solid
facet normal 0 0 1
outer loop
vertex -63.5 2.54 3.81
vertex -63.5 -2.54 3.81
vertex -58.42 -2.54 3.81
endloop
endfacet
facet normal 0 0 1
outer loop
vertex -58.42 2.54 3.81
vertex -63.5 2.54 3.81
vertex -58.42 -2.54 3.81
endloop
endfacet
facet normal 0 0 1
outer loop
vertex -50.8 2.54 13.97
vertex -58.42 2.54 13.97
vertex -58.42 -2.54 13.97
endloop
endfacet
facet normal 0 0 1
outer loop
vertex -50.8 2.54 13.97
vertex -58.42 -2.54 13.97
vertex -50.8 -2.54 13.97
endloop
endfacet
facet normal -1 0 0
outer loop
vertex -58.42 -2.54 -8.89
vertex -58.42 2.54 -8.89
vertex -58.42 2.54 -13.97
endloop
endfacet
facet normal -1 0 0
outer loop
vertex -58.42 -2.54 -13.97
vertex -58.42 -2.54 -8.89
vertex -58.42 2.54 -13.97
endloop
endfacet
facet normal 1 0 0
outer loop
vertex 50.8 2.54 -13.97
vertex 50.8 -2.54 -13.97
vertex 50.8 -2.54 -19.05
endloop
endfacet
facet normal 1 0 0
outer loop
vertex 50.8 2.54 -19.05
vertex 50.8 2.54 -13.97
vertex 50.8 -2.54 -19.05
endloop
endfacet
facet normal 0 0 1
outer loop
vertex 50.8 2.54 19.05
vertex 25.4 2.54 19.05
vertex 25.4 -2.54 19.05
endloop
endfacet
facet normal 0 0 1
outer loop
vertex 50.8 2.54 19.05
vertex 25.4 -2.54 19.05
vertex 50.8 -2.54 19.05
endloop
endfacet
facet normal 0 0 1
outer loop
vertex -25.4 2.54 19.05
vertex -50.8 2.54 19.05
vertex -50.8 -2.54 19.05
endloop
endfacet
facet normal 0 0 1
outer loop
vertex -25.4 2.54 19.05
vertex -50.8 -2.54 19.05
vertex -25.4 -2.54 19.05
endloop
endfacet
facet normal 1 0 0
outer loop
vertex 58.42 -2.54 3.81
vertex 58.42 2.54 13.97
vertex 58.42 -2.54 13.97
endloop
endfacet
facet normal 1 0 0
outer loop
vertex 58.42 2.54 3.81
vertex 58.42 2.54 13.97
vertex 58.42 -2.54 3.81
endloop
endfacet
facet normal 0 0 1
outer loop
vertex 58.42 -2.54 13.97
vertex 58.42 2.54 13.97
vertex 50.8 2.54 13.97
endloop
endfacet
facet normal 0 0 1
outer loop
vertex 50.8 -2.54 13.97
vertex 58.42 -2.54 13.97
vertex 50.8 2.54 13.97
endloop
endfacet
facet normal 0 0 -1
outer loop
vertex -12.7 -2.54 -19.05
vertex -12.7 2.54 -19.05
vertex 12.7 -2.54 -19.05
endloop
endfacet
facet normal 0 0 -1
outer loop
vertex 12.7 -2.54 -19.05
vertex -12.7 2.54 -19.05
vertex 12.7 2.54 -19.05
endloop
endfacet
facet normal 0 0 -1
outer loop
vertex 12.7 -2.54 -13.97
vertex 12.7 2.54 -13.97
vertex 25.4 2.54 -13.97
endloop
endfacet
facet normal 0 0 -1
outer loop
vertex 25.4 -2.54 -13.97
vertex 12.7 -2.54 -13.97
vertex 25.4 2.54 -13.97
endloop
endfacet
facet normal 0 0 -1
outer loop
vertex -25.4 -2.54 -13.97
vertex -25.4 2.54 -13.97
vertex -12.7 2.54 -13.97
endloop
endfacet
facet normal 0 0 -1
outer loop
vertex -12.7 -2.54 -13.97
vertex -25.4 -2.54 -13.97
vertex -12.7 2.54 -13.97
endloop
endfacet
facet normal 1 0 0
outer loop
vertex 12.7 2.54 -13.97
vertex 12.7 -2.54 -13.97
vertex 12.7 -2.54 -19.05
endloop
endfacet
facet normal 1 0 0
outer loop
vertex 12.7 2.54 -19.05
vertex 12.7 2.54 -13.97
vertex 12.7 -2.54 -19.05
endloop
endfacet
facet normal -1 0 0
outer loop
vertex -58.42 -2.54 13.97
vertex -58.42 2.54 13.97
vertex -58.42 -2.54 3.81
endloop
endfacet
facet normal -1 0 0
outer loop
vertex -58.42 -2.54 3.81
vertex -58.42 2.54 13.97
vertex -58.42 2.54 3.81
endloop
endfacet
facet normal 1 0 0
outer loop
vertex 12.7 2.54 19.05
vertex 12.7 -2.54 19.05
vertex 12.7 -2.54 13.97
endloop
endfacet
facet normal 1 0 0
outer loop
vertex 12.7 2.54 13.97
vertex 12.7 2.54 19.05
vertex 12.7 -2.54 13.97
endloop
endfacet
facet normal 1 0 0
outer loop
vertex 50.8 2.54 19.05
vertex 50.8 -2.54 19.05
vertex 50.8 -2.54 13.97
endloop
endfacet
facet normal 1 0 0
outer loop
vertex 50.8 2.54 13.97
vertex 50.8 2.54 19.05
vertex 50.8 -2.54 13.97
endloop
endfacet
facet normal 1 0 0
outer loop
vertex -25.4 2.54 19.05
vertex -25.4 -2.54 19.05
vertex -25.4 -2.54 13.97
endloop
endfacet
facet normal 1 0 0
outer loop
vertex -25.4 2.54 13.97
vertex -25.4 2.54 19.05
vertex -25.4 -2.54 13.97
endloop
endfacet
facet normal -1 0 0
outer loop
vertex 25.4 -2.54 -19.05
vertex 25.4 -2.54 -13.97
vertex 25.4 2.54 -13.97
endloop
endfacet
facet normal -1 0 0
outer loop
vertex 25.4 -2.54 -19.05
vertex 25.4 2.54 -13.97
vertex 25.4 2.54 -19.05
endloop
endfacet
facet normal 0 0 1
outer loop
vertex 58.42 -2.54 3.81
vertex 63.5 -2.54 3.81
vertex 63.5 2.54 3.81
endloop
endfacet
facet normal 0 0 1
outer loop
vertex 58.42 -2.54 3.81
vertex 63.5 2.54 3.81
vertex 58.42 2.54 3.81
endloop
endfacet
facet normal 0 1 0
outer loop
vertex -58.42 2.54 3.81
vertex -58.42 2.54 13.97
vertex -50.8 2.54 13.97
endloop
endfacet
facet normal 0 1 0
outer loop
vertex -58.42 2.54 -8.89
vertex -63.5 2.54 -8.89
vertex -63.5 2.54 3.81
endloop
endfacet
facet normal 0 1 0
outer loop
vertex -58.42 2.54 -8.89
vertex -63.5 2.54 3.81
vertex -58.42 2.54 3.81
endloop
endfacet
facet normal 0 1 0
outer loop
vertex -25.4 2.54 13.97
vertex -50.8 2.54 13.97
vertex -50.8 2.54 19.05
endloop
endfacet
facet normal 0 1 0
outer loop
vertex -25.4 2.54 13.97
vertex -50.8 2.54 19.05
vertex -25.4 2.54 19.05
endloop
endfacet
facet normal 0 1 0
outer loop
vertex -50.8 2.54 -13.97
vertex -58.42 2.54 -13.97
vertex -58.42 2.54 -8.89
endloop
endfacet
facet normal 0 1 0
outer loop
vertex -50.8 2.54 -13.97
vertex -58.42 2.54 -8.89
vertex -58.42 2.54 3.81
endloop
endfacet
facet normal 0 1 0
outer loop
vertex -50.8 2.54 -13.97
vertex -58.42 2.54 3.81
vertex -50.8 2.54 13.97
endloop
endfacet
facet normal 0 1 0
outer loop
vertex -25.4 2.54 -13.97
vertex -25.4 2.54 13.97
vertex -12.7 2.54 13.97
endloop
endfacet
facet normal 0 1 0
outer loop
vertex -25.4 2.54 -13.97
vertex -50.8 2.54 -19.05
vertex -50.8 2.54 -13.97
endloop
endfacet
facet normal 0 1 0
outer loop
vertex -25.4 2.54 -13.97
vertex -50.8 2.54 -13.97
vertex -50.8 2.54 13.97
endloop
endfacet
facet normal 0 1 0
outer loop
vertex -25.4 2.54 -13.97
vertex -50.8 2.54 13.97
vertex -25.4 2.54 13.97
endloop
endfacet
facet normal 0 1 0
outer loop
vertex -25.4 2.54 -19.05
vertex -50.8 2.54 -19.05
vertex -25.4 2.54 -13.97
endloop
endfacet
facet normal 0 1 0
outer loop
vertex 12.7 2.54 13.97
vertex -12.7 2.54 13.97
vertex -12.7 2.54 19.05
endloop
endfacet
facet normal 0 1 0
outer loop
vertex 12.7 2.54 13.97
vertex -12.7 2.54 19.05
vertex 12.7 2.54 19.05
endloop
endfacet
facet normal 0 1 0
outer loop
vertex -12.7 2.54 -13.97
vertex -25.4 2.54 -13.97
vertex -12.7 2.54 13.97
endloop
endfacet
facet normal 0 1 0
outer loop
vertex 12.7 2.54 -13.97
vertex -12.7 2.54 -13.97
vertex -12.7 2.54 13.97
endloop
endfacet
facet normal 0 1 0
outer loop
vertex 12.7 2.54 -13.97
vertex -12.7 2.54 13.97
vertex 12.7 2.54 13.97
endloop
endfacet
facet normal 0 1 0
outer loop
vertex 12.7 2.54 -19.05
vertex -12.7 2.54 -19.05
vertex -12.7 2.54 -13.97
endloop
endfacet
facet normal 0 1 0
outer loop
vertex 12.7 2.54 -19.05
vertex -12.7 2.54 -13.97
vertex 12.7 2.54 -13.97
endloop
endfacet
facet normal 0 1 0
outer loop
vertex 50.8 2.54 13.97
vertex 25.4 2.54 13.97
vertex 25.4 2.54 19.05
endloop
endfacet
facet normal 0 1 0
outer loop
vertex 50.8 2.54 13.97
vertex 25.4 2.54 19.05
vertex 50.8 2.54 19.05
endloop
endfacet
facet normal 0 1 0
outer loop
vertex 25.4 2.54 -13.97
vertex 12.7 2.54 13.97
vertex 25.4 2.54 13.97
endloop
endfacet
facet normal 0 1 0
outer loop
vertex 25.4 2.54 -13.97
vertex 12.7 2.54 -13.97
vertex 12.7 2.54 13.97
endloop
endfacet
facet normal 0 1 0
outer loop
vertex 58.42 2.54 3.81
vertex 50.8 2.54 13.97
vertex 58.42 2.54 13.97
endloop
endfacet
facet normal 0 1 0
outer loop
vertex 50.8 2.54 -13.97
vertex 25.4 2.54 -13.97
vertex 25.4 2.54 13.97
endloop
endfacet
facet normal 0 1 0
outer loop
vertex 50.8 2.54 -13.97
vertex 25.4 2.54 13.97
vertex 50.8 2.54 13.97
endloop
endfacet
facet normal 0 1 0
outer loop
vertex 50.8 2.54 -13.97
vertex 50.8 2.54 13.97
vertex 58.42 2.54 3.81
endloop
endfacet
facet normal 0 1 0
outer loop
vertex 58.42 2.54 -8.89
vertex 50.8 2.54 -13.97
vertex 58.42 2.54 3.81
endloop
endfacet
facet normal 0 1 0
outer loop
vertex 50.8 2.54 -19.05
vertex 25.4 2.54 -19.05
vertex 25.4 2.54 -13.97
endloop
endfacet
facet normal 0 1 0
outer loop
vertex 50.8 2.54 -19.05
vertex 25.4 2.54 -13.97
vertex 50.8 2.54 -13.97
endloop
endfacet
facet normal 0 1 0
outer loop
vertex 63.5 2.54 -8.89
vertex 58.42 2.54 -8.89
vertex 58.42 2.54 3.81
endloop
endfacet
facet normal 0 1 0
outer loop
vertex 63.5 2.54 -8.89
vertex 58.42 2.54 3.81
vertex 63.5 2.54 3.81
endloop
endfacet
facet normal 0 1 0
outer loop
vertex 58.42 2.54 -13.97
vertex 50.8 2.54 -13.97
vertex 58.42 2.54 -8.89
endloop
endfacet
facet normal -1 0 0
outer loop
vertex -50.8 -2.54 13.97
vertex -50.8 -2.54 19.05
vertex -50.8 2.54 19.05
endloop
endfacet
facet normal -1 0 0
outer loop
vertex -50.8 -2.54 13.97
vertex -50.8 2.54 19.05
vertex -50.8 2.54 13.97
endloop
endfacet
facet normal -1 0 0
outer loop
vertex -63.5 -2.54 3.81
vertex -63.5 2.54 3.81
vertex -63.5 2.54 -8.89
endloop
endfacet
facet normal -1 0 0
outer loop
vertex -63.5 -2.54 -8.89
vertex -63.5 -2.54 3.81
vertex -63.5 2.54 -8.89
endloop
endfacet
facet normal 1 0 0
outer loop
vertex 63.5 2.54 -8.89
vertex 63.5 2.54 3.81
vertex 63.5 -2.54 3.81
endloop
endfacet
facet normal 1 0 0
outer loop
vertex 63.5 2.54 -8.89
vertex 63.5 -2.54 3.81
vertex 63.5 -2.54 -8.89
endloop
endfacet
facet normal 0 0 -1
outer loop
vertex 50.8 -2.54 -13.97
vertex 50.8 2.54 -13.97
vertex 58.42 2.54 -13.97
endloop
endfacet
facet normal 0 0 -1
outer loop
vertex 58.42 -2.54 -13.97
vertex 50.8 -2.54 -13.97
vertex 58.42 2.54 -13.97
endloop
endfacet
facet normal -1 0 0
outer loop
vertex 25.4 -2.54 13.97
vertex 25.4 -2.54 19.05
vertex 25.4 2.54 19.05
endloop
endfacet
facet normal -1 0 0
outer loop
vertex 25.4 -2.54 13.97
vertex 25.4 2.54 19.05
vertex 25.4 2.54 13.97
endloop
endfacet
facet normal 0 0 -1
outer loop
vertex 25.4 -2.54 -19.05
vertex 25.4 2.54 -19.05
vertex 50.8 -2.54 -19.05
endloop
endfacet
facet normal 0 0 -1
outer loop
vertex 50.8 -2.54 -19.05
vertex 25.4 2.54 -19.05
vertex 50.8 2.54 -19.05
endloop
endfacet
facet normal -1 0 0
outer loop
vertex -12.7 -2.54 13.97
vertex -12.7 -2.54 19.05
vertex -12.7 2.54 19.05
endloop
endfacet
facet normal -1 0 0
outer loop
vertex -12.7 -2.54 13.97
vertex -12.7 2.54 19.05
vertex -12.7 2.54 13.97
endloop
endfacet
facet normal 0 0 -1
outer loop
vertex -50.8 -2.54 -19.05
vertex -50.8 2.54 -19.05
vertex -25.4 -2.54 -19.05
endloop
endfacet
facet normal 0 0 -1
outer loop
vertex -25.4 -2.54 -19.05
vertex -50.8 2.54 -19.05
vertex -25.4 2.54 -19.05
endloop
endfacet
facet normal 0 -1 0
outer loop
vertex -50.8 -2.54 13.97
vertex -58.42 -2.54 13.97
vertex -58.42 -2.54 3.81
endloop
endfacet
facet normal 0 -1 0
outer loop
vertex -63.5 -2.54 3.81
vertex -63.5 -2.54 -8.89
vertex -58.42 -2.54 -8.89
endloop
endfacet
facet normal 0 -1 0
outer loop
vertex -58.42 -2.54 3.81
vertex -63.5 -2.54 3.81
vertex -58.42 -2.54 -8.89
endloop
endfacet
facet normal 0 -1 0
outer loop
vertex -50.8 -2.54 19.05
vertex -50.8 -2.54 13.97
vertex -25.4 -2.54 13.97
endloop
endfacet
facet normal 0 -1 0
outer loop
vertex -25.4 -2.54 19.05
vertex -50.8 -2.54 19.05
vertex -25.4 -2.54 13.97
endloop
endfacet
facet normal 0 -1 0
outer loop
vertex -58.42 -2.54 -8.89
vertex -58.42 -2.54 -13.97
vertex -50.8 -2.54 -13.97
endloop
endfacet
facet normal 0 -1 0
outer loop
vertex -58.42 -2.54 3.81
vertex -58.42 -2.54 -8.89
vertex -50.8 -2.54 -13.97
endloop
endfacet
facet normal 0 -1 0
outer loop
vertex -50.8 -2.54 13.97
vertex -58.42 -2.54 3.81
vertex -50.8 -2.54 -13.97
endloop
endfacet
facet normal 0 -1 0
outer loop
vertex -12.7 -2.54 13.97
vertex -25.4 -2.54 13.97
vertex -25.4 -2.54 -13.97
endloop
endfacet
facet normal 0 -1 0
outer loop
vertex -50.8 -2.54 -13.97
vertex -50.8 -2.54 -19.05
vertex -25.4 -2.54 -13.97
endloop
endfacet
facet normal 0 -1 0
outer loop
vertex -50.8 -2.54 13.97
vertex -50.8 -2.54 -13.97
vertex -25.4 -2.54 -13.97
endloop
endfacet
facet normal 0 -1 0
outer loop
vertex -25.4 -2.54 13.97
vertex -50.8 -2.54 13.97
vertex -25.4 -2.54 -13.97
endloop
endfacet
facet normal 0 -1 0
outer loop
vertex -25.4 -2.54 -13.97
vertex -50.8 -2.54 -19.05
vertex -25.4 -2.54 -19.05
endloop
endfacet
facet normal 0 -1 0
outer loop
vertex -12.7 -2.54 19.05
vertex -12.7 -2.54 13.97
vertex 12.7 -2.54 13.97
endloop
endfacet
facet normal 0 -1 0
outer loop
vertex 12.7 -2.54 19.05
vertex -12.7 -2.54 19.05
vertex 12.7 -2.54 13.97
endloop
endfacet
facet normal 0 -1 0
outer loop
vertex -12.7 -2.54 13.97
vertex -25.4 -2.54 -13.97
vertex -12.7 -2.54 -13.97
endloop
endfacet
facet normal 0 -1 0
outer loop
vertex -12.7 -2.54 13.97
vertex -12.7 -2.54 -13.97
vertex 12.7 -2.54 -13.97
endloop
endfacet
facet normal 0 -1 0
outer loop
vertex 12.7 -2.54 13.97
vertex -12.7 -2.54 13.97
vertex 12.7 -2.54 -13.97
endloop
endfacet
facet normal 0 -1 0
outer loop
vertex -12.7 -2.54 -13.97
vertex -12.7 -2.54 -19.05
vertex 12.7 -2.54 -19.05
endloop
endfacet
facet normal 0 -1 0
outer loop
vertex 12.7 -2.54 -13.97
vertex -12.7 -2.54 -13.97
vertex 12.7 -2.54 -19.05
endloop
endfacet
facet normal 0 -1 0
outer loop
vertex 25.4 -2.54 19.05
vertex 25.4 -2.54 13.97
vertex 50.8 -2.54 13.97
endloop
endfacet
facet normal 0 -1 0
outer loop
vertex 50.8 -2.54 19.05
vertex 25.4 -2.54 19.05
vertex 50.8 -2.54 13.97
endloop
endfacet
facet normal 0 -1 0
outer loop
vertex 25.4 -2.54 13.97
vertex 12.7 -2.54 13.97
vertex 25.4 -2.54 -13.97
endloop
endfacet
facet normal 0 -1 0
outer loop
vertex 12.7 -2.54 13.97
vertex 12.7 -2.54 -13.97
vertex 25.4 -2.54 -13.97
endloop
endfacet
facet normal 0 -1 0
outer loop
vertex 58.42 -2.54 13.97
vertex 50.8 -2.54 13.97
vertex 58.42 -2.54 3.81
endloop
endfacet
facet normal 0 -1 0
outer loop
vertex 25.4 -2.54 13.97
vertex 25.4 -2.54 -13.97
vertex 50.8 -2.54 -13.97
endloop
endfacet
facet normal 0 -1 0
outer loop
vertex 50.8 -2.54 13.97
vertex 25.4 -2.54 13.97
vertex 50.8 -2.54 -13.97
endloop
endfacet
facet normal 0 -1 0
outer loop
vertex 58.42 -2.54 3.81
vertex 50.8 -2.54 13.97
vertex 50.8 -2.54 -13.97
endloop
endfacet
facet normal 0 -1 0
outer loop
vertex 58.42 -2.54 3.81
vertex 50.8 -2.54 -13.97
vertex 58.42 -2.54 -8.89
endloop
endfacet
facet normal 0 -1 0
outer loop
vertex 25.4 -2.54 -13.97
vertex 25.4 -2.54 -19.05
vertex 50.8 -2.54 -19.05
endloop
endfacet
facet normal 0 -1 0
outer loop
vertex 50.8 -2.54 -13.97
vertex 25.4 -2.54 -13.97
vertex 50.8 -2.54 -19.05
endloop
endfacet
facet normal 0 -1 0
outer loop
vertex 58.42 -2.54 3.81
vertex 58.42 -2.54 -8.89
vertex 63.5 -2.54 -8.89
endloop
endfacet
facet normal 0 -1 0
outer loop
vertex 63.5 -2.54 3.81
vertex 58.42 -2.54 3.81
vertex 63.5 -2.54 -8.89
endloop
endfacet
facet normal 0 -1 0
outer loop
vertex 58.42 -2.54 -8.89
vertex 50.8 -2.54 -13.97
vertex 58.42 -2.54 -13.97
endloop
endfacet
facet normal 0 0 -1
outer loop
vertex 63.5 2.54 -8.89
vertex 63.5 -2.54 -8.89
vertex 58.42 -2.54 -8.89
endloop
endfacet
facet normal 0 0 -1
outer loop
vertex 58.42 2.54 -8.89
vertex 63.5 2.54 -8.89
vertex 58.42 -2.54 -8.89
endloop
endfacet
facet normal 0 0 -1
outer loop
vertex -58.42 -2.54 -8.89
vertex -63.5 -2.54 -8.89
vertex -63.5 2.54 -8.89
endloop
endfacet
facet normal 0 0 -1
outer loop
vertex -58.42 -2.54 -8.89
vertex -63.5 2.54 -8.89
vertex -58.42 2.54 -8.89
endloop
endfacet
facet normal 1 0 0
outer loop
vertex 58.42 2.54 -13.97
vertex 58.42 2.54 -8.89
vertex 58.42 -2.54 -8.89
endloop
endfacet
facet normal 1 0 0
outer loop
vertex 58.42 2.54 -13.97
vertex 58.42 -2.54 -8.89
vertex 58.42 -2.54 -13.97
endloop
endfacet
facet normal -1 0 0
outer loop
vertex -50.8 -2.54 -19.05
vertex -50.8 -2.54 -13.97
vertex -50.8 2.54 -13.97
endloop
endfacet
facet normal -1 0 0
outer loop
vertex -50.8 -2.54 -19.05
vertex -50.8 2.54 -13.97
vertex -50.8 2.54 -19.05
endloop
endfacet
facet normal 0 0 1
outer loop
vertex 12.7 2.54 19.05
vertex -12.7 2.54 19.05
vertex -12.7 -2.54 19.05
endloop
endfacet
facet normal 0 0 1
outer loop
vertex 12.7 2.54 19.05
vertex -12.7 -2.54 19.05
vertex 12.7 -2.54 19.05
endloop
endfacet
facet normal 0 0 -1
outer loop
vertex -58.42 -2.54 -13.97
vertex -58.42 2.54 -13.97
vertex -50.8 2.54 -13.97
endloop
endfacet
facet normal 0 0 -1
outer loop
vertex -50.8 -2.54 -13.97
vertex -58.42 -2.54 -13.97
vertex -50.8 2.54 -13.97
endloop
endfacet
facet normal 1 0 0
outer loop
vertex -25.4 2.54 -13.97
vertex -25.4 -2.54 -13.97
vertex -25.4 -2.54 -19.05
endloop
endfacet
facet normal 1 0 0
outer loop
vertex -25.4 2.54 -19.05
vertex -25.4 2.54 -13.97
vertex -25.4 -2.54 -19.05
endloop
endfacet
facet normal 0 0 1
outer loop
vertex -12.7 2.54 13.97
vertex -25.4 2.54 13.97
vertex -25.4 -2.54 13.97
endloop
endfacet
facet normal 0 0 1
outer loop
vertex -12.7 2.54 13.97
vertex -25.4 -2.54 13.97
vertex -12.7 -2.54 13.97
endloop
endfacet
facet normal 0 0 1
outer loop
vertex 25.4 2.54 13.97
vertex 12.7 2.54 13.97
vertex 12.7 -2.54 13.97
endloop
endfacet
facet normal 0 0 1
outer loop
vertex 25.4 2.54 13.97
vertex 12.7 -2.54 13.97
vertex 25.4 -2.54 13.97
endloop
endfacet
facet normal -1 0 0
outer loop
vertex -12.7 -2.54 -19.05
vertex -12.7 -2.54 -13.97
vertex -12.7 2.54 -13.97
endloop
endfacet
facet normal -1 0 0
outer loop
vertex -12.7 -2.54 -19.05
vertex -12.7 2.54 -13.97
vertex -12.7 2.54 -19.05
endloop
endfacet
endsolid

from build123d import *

# Parameters (mm, degrees)
SKETCH1_W           = 127
SKETCH1_H           = 38.1
BOSS_EXTRUDE1_DEPTH = 2.54
SKETCH2_W           = 5.08
SKETCH2_H           = 10.16
SKETCH2_H_2         = 15.24
CUT_EXTRUDE1_DEPTH  = 5.08
SKETCH3_W           = 12.7
SKETCH3_H           = 5.08
CUT_EXTRUDE2_DEPTH  = 5.08
SKETCH4_W           = 12.7
SKETCH4_H           = 5.08
CUT_EXTRUDE4_DEPTH  = 5.08
LPATTERN1_COUNT     = 2
LPATTERN1_PITCH     = 38.1
SKETCH7_W           = 116.84
SKETCH7_H           = 5.08
CUT_EXTRUDE7_DEPTH  = 5.08
SKETCH8_W           = 25.4
SKETCH8_H           = 5.08
BOSS_EXTRUDE2_DEPTH = 5.08


with BuildPart() as part:
    # Sketch1 → Boss-Extrude1 (new body, symmetric)
    with BuildSketch(Plane(origin=(0, 0, 0), x_dir=(1, 0, 0), z_dir=(0, 1, 0))):
        Rectangle(SKETCH1_W, SKETCH1_H)
    extrude(amount=BOSS_EXTRUDE1_DEPTH, both=True)

    # Sketch2 → Cut-Extrude1 (cut)
    with BuildSketch(Plane(origin=(0, 2.54, 0), x_dir=(1, 0, 0), z_dir=(0, 1, 0))):
        with Locations((-60.96, 13.97)):
            Rectangle(SKETCH2_W, SKETCH2_H)
        with Locations((-60.96, -11.43)):
            Rectangle(SKETCH2_W, SKETCH2_H_2)
    cut_extrude1 = extrude(amount=-CUT_EXTRUDE1_DEPTH, mode=Mode.SUBTRACT)

    # Mirror1: Cut-Extrude1 across plane
    add(cut_extrude1.mirror(Plane(origin=(0, 0, 0), x_dir=(0, 0, 1), z_dir=(1, 0, 0))), mode=Mode.SUBTRACT)

    # Sketch3 → Cut-Extrude2 (cut)
    with BuildSketch(Plane(origin=(0, 2.54, 0), x_dir=(1, 0, 0), z_dir=(0, 1, 0))):
        with Locations((-57.15, -16.51)):
            Rectangle(SKETCH3_W, SKETCH3_H)
    cut_extrude2 = extrude(amount=-CUT_EXTRUDE2_DEPTH, mode=Mode.SUBTRACT)

    # Mirror2: Cut-Extrude2 across plane
    add(cut_extrude2.mirror(Plane(origin=(0, 0, 0), x_dir=(0, 0, 1), z_dir=(1, 0, 0))), mode=Mode.SUBTRACT)

    # Sketch4 → Cut-Extrude4 (cut)
    with BuildSketch(Plane(origin=(0, 2.54, 0), x_dir=(1, 0, 0), z_dir=(0, 1, 0))):
        with Locations((-19.05, -16.51)):
            Rectangle(SKETCH4_W, SKETCH4_H)
    cut_extrude4 = extrude(amount=-CUT_EXTRUDE4_DEPTH, mode=Mode.SUBTRACT)

    # LPattern1: Cut-Extrude4 ×2
    with Locations(*[(i * LPATTERN1_PITCH, 0, 0) for i in range(1, LPATTERN1_COUNT)]):
        add(cut_extrude4, mode=Mode.SUBTRACT)

    # Sketch7 → Cut-Extrude7 (cut)
    with BuildSketch(Plane(origin=(0, 2.54, 0), x_dir=(1, 0, 0), z_dir=(0, 1, 0))):
        with Locations((0, 16.51)):
            Rectangle(SKETCH7_W, SKETCH7_H)
    extrude(amount=-CUT_EXTRUDE7_DEPTH, mode=Mode.SUBTRACT)

    # Sketch8 → Boss-Extrude2 (add)
    with BuildSketch(Plane(origin=(0, 2.54, 0), x_dir=(1, 0, 0), z_dir=(0, 1, 0))):
        with Locations((-38.1, 16.51)):
            Rectangle(SKETCH8_W, SKETCH8_H)
        with Locations((0, 16.51)):
            Rectangle(SKETCH8_W, SKETCH8_H)
        with Locations((38.1, 16.51)):
            Rectangle(SKETCH8_W, SKETCH8_H)
    extrude(amount=-BOSS_EXTRUDE2_DEPTH)


solid = part.part
